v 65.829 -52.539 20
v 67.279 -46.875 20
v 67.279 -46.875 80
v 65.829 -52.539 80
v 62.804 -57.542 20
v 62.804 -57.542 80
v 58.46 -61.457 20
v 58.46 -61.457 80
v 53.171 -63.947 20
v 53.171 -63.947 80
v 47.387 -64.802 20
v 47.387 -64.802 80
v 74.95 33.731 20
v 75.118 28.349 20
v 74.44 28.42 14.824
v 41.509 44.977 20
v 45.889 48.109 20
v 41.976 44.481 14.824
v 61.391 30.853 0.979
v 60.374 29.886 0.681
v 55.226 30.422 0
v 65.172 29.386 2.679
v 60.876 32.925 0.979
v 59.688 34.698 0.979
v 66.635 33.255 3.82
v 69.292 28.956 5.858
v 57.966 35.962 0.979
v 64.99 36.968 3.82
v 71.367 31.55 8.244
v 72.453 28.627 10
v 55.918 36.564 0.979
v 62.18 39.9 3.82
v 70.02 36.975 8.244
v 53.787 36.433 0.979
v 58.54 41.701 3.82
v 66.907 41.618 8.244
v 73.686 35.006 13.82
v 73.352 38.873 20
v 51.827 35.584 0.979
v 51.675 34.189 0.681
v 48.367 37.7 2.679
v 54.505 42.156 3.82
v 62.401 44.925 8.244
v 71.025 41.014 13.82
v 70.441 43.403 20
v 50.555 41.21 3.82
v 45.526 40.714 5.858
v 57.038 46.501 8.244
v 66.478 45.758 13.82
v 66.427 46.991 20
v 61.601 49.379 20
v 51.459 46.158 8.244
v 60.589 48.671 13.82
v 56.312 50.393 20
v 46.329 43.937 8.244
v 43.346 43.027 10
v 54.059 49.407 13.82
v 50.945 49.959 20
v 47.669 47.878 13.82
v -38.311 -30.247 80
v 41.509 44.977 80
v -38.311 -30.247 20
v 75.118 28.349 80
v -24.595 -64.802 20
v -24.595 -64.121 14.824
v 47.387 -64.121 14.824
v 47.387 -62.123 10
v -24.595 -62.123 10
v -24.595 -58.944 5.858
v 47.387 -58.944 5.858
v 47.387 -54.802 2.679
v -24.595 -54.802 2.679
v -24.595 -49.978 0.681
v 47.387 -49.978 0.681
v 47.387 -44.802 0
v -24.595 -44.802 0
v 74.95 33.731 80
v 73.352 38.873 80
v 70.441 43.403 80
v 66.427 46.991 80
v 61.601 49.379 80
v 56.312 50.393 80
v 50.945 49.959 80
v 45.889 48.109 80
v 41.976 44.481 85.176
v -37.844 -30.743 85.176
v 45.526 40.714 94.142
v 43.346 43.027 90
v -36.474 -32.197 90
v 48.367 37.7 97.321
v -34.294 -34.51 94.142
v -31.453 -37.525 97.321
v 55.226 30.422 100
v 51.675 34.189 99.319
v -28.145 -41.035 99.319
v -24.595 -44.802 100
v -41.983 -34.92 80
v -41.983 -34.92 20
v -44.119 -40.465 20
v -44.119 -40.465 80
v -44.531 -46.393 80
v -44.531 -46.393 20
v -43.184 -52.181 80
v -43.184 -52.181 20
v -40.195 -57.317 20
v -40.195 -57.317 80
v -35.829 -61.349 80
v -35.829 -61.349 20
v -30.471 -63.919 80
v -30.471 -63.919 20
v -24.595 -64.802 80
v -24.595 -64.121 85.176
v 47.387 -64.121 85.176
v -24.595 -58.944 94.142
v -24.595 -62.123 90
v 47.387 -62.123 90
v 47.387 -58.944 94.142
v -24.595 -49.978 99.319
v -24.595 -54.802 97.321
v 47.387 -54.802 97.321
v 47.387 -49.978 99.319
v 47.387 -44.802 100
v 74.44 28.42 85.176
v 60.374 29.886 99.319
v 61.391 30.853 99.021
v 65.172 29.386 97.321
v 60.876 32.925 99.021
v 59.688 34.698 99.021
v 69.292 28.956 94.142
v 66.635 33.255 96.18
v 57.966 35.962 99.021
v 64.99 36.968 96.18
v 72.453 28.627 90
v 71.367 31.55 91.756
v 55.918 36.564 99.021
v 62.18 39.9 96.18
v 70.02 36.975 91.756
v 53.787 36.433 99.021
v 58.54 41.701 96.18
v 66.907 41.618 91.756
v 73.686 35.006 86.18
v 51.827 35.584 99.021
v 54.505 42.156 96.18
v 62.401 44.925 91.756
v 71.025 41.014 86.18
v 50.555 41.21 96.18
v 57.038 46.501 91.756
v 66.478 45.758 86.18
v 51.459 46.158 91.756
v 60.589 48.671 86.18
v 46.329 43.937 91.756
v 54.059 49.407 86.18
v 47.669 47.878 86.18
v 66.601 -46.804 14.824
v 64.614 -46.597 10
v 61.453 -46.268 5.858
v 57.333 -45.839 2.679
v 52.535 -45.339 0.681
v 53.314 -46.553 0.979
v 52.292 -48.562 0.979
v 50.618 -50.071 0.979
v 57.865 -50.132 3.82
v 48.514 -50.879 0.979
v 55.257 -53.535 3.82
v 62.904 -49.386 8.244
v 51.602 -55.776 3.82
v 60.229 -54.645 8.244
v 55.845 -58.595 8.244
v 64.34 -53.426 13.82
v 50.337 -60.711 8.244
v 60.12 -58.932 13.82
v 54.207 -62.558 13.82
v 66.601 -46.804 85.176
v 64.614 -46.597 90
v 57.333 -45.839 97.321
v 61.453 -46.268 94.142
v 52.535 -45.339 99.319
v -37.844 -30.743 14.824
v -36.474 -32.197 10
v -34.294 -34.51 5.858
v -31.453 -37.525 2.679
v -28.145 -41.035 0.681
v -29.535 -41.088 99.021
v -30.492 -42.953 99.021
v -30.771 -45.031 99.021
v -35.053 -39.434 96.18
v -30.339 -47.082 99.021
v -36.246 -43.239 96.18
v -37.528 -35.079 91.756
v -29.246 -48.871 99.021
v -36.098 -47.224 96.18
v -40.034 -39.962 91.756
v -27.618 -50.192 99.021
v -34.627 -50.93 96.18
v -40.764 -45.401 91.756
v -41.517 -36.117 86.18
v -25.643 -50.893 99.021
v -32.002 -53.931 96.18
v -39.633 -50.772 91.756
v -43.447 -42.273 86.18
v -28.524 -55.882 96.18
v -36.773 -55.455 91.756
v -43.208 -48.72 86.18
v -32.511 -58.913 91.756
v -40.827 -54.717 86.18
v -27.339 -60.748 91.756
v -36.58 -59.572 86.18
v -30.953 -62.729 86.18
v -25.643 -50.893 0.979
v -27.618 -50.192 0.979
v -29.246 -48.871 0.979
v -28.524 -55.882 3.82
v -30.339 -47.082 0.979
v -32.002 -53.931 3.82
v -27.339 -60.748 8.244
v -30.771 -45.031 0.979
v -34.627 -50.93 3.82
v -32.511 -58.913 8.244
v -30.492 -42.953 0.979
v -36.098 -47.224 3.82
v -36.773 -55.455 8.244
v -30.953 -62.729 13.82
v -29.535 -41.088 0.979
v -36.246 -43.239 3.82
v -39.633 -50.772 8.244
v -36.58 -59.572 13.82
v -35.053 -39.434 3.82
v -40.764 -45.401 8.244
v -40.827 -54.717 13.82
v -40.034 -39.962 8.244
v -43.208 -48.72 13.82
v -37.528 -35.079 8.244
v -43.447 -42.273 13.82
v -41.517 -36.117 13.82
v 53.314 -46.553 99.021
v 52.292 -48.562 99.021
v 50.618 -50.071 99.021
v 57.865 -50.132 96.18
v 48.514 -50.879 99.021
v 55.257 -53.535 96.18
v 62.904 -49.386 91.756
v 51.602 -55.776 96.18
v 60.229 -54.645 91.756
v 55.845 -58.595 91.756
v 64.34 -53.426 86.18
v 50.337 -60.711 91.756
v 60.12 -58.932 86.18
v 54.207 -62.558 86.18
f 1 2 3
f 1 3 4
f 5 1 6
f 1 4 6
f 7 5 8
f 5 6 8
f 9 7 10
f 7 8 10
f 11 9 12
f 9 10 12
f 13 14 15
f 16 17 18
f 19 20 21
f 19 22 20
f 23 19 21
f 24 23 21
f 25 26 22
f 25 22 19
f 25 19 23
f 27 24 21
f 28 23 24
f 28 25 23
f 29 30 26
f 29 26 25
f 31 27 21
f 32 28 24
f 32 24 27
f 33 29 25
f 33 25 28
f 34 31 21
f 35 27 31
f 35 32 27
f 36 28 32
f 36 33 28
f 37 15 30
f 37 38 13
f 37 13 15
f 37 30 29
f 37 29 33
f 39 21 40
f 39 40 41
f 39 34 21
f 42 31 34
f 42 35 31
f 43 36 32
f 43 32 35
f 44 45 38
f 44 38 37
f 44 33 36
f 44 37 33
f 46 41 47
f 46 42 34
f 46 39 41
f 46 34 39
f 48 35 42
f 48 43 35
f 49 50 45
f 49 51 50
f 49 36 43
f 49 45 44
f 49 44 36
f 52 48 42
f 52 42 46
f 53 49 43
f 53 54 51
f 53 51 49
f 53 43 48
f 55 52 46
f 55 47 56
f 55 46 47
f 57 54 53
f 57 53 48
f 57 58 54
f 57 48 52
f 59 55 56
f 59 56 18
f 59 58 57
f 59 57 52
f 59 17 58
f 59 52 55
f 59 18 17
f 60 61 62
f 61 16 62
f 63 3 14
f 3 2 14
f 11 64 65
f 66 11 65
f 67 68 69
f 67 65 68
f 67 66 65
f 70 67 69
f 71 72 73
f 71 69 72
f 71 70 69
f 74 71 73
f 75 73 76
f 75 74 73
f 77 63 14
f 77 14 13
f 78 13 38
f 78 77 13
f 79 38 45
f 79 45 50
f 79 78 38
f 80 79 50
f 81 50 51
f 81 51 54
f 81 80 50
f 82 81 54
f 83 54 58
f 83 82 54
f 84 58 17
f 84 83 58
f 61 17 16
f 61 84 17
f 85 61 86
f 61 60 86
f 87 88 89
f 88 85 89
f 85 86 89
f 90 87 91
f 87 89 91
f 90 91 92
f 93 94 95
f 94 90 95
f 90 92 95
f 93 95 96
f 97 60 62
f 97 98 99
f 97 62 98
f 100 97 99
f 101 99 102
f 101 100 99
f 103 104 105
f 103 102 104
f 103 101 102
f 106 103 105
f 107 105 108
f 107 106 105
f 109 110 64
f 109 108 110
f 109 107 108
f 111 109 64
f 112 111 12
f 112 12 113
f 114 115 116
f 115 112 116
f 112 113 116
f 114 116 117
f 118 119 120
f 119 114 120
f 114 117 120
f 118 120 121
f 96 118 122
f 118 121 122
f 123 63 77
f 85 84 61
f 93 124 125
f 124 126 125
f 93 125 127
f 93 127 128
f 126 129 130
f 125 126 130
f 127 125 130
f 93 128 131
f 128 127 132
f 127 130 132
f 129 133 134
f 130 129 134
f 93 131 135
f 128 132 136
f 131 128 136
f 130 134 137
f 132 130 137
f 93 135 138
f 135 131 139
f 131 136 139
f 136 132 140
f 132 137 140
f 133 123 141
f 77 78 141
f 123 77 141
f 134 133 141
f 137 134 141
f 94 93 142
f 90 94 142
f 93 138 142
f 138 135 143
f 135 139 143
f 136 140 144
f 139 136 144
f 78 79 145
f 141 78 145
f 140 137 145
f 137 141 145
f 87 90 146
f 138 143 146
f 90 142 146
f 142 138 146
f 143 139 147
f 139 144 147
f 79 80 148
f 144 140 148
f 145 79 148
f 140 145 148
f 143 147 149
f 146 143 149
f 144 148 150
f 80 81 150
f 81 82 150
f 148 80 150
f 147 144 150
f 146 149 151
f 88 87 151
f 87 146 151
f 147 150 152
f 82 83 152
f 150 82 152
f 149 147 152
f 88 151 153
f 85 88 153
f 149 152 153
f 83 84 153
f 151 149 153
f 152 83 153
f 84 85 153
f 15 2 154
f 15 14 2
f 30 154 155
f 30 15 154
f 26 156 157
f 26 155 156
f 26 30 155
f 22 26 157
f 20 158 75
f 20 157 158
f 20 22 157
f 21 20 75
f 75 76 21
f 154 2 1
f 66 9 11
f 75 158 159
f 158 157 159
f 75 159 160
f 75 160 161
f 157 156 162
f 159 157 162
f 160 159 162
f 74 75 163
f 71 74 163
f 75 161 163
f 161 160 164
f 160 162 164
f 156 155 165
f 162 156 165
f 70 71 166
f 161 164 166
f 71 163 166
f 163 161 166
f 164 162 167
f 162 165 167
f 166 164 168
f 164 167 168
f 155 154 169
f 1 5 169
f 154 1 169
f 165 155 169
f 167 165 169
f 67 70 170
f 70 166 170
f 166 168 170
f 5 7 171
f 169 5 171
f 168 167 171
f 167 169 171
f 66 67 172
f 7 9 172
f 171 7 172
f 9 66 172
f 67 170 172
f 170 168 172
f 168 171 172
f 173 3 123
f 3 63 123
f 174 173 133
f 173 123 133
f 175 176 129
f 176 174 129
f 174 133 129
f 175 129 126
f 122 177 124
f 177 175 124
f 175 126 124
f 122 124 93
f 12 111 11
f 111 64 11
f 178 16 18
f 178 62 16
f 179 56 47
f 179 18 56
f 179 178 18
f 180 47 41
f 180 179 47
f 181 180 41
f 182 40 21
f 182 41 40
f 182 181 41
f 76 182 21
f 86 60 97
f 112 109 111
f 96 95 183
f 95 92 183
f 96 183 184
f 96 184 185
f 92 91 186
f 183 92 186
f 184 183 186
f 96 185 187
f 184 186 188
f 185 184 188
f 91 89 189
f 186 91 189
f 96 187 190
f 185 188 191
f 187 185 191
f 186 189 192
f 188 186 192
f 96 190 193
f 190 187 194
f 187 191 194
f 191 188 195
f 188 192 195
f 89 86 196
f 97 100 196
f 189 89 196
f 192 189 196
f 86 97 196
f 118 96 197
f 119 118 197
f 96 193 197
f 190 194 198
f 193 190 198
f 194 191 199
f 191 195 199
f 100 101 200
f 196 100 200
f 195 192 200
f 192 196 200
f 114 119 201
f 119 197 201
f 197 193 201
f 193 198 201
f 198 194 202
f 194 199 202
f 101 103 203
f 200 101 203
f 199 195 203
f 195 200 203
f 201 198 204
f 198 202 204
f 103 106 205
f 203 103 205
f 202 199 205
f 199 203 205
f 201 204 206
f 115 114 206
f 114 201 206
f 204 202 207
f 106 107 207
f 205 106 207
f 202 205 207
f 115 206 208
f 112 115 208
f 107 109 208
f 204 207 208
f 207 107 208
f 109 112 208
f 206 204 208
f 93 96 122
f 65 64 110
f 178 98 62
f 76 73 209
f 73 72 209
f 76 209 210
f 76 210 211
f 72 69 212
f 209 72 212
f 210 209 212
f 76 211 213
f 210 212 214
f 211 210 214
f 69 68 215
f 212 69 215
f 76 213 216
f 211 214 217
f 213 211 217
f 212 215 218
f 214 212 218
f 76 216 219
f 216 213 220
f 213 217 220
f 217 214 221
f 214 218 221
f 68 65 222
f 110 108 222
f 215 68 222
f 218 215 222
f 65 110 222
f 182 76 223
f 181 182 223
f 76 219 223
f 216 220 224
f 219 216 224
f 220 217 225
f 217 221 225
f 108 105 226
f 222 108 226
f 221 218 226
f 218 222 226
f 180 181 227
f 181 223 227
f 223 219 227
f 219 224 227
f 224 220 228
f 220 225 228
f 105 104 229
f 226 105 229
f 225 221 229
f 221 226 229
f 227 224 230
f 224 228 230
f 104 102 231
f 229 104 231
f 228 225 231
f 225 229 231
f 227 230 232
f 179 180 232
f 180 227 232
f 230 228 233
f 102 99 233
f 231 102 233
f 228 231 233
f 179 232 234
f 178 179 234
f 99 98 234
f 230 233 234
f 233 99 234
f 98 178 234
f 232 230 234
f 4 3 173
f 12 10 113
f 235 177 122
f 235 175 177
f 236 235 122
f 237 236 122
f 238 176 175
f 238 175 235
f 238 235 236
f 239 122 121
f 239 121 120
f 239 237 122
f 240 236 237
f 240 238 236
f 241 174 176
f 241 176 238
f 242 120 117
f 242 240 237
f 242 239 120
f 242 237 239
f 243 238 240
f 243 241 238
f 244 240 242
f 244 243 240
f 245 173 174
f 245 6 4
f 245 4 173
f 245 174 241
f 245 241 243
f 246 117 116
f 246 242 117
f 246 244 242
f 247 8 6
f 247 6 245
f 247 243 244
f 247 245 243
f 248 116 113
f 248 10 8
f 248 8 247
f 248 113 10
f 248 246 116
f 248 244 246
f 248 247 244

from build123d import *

# Parameters (mm, degrees)
F1_DEPTH = 100
F2_R     = 20


with BuildPart() as f1:
    # F0 (on Top) → F1 (new body)
    with BuildSketch(Plane.XY):
        Polygon((65.410733, -64.802073), (80.699533, 81.911258), (-68.142453, -58.360403), (-74.977696, -64.802073), align=None)
    extrude(amount=F1_DEPTH)

    # F2
    f2_edges = [f1.edges().sort_by_distance(p)[0] for p in [
        (73.055133, 8.554593, 100),
        (2.860919, 8.554593, 100),
        (-4.783481, -64.802073, 100),
        (65.410733, -64.802073, 50),
        (80.699533, 81.911258, 50),
        (73.055133, 8.554593, 0),
        (-74.977696, -64.802073, 50),
        (-4.783481, -64.802073, 0),
        (2.860919, 8.554593, 0),
    ]]
    fillet(f2_edges, radius=F2_R)


solid = f1.part
